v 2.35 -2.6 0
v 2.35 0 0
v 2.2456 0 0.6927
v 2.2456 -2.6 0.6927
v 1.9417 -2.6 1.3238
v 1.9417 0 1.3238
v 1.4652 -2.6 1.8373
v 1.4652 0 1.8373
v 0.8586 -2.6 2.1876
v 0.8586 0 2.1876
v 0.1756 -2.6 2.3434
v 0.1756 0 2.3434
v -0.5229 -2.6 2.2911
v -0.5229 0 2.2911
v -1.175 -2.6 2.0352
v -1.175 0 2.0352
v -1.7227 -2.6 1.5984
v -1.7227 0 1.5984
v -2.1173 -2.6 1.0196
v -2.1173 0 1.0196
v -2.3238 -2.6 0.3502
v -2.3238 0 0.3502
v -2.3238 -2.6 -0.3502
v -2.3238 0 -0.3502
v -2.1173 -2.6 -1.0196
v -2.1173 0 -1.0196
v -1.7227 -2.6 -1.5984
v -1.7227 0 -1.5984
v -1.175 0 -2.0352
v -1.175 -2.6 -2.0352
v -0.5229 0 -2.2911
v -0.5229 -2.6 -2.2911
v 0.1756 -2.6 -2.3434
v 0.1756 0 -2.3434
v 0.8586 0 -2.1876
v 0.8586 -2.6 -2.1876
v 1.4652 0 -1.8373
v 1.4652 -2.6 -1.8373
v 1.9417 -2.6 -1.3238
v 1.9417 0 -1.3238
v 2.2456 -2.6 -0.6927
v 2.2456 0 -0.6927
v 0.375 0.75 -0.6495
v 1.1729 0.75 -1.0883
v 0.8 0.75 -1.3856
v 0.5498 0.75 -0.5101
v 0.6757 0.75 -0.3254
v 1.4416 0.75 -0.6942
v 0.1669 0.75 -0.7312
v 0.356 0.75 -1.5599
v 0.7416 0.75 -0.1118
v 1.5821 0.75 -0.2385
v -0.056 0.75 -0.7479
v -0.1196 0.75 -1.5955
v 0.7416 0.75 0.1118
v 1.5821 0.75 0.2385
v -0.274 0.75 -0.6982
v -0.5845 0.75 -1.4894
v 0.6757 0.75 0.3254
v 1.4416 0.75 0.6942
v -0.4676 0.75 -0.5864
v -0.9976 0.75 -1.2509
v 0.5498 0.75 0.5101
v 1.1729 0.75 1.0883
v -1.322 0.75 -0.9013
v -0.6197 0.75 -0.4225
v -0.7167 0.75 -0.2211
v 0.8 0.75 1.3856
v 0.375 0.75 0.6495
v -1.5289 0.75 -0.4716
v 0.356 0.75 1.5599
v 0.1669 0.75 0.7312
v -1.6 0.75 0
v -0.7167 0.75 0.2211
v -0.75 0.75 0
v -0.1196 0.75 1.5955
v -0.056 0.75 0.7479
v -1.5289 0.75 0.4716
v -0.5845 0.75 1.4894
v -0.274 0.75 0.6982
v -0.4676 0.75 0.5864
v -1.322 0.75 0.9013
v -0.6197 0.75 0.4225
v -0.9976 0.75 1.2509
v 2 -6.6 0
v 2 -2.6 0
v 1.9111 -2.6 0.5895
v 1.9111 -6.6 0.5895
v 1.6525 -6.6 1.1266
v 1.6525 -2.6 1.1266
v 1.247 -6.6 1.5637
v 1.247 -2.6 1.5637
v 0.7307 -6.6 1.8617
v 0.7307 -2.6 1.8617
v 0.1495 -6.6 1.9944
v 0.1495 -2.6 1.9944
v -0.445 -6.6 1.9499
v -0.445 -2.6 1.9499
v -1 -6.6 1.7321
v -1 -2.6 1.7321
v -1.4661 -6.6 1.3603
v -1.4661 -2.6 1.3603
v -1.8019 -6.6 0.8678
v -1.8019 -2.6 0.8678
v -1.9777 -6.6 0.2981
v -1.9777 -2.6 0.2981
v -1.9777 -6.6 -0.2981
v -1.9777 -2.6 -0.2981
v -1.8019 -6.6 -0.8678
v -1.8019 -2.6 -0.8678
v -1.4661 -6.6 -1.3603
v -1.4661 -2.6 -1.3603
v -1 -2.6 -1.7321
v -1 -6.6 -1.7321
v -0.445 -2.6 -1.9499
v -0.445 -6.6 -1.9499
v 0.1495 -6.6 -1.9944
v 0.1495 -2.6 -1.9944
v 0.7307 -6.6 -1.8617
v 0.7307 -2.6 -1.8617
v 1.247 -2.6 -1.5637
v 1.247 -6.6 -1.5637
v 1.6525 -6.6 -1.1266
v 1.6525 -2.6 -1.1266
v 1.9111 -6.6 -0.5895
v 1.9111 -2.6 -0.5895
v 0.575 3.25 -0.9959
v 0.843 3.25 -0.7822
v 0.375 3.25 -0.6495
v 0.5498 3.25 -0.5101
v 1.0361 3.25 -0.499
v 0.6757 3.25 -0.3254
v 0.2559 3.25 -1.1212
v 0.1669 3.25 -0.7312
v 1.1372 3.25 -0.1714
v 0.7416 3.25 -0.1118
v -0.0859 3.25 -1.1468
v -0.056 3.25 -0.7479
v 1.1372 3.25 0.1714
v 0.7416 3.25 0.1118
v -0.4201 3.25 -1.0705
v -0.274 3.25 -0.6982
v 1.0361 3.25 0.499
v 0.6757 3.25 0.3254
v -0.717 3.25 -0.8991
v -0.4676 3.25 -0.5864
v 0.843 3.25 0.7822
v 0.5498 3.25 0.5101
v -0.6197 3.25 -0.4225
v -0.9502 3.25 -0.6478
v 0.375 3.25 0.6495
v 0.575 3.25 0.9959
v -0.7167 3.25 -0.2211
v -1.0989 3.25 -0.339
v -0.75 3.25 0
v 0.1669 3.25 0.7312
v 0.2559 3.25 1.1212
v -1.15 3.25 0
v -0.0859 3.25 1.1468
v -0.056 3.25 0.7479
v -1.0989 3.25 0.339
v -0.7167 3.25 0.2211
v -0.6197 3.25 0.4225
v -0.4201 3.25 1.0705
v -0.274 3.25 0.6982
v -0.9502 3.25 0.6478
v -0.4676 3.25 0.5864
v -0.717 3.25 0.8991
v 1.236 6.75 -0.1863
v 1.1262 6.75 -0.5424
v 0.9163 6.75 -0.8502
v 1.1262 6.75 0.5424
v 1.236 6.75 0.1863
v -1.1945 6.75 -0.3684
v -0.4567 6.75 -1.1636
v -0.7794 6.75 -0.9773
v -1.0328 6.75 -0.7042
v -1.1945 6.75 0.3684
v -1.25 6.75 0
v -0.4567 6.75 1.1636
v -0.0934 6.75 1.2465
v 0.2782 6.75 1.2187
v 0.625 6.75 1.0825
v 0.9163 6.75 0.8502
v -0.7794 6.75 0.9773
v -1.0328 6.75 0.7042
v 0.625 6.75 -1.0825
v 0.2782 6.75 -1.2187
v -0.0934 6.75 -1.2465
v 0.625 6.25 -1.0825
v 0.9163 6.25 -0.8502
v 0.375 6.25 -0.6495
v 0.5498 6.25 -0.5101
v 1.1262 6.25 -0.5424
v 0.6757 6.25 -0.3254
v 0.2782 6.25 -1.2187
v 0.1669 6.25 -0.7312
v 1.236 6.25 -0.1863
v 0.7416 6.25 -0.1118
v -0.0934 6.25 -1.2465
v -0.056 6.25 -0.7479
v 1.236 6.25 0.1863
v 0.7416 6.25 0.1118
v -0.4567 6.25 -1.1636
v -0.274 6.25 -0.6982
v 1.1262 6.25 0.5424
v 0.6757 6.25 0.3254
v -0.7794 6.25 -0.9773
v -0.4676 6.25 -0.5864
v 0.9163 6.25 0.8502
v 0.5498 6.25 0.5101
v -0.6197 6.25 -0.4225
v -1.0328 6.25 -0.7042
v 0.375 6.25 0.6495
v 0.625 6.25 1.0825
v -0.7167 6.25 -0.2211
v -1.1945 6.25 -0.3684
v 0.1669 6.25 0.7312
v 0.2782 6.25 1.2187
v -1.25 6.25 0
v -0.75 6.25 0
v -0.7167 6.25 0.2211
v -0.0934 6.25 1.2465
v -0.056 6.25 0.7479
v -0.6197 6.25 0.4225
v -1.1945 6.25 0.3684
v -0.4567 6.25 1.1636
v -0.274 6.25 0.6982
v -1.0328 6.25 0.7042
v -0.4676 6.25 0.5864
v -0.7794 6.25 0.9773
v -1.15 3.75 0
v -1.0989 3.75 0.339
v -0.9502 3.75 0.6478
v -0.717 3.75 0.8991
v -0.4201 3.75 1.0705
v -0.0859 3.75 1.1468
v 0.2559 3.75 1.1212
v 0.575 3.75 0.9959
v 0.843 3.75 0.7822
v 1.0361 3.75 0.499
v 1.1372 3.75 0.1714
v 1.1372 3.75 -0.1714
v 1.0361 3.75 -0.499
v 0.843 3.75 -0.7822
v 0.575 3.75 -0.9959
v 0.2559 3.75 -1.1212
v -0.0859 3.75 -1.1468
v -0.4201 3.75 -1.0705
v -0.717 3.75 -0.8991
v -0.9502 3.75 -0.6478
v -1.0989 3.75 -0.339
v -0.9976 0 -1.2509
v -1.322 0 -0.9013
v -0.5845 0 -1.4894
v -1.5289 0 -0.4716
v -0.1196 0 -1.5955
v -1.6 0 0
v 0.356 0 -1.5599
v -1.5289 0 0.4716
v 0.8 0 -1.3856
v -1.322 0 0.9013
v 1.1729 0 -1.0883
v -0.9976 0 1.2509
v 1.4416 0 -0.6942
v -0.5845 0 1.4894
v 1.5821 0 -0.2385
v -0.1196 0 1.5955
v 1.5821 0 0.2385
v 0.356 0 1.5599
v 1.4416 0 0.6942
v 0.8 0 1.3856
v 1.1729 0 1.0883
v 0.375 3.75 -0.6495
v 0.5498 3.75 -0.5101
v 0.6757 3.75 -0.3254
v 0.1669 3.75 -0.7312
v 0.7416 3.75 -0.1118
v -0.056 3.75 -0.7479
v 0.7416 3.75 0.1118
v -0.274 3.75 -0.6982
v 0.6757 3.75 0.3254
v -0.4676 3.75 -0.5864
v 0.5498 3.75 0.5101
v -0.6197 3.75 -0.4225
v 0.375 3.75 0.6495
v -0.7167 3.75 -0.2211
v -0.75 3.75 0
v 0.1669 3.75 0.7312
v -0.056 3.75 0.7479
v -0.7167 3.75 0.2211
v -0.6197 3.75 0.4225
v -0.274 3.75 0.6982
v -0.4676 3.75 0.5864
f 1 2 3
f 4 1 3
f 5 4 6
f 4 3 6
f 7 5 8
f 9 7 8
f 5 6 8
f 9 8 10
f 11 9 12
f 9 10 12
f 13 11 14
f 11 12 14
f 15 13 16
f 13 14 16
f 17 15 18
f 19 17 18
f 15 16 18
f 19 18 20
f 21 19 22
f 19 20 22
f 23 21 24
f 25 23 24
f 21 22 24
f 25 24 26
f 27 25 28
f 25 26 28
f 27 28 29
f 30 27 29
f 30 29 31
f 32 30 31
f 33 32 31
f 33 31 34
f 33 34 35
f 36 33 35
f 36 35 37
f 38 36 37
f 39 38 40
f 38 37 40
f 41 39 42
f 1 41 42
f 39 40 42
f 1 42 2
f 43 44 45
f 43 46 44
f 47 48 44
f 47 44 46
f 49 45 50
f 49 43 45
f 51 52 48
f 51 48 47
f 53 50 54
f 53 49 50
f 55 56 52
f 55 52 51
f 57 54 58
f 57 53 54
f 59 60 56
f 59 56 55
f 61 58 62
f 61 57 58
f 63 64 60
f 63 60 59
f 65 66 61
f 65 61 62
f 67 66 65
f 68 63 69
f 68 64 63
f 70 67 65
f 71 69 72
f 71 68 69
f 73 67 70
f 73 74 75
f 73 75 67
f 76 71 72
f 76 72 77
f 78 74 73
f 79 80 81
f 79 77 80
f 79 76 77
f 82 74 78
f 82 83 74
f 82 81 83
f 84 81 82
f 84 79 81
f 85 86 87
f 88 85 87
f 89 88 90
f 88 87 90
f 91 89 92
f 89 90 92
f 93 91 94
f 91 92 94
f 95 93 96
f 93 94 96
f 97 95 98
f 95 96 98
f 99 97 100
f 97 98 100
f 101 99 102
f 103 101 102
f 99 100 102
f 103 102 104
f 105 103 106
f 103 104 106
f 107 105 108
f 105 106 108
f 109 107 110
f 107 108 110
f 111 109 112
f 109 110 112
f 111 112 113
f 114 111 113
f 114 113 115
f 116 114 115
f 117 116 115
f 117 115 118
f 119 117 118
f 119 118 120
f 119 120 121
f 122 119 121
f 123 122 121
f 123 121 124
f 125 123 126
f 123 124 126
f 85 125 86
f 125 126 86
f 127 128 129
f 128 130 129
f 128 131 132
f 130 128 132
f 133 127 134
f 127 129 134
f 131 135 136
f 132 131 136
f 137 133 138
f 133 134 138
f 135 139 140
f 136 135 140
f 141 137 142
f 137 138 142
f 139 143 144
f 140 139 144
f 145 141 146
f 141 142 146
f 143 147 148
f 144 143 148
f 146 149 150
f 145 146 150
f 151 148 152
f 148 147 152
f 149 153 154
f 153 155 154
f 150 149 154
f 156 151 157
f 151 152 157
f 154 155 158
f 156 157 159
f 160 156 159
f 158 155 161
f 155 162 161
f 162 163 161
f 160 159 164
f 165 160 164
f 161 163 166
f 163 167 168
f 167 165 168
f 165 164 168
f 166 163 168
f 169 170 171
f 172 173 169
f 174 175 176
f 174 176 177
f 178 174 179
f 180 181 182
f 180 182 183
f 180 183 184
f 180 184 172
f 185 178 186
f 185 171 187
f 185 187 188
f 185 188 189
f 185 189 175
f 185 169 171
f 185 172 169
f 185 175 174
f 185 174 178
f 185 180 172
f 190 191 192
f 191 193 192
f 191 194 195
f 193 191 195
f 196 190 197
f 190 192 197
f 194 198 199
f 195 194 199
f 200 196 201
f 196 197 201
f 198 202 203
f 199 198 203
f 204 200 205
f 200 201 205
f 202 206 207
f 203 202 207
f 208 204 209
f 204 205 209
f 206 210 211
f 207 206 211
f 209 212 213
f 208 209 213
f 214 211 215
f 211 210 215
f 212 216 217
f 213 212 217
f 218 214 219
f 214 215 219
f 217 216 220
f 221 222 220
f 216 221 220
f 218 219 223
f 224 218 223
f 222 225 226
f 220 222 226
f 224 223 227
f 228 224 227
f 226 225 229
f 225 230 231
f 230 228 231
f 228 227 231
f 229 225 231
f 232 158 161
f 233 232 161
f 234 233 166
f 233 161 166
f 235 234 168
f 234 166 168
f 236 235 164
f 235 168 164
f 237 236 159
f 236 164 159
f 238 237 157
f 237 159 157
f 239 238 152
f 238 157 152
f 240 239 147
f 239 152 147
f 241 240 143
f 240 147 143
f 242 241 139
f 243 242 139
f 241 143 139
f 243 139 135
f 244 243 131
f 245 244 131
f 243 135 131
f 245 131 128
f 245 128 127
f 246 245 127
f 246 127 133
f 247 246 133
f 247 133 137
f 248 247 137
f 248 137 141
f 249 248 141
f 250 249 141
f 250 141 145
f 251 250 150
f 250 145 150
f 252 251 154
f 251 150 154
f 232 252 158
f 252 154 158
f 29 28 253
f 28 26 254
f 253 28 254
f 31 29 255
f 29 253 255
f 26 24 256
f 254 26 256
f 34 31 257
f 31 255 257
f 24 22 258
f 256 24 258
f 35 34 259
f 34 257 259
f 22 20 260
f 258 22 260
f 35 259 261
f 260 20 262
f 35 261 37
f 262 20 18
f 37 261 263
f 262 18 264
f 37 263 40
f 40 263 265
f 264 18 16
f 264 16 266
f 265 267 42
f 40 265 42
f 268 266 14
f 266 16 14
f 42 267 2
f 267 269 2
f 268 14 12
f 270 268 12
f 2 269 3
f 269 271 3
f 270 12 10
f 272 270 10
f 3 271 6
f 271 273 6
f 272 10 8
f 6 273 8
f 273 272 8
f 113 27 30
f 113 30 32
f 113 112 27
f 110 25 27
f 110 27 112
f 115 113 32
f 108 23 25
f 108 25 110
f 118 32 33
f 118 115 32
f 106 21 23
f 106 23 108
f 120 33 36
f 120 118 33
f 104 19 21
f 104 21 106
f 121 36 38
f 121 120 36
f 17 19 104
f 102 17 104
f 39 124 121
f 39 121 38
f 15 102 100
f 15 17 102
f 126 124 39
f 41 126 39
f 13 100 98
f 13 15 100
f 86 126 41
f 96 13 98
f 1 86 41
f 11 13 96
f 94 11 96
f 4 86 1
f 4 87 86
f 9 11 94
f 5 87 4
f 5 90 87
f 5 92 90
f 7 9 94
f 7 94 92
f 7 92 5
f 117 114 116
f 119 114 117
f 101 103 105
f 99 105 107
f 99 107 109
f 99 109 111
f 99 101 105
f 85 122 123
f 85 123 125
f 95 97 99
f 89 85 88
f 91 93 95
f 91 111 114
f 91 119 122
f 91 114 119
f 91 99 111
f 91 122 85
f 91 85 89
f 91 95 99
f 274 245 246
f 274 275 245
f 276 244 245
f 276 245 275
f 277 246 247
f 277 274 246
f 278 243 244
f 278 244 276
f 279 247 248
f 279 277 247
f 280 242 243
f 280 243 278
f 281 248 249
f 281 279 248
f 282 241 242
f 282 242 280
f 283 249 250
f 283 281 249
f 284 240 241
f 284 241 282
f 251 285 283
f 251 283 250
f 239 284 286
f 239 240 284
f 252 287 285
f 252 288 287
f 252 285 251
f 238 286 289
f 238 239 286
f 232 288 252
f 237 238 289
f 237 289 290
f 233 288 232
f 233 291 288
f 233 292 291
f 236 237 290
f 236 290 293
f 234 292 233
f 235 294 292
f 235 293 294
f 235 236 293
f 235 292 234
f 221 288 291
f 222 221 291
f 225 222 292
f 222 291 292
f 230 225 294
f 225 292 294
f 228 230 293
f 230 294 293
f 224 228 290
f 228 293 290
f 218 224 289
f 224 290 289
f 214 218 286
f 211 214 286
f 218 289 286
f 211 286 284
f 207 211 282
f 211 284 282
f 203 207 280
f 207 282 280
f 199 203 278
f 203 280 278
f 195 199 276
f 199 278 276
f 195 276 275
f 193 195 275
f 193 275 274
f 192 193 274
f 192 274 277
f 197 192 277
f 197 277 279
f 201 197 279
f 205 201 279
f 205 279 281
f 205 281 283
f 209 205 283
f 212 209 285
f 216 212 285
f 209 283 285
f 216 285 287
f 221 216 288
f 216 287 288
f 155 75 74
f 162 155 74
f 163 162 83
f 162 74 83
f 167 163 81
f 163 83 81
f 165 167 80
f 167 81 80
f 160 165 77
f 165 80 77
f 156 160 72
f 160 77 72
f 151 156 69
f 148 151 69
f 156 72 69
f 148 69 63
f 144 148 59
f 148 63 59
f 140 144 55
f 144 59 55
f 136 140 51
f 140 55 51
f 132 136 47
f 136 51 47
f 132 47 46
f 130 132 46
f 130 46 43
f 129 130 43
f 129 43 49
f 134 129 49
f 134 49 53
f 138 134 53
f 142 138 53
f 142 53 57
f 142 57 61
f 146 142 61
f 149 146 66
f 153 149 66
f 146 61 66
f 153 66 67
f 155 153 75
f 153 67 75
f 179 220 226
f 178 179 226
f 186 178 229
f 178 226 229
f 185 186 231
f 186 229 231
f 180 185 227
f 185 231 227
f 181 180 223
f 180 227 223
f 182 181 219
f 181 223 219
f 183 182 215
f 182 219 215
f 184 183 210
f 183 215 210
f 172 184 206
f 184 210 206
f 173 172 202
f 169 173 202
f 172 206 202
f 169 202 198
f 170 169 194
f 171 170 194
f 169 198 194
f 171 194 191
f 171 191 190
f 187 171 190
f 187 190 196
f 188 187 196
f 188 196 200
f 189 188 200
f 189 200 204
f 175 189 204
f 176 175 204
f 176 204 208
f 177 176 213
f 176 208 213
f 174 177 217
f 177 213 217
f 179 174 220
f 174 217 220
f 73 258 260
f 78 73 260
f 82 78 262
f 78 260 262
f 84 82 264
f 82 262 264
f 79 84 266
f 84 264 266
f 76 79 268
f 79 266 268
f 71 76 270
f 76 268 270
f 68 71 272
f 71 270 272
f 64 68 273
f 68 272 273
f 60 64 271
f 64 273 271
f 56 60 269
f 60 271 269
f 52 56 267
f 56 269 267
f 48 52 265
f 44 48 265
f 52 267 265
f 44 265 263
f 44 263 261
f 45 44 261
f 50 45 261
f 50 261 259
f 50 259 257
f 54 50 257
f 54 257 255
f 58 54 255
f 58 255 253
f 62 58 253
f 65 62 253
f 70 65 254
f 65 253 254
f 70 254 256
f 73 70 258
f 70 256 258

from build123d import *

# Parameters (mm, degrees)
F0_R      = 2.35
F1_DEPTH  = 2.6
F2_R      = 2
F3_DEPTH  = 4
F4_R      = 1.6
F5_DEPTH  = 0.75
F6_R      = 0.75
F7_DEPTH  = 2.5
F8_R      = 1.15
F9_DEPTH  = 0.5
F10_R     = 0.75
F11_DEPTH = 2.5
F12_R     = 1.25
F13_DEPTH = 0.5


with BuildPart() as f1:
    # F0 (on Front) → F1 (new body)
    with BuildSketch(Plane.XZ):
        Circle(F0_R)
    extrude(amount=F1_DEPTH)

    # F2 (on face) → F3 (join)
    with BuildSketch(Plane.XZ.offset(2.6)):
        Circle(F2_R)
    extrude(amount=F3_DEPTH)

    # F4 (on face) → F5 (join)
    with BuildSketch(Plane(origin=(0, 0, 0), x_dir=(-1, 0, 0), z_dir=(0, 1, 0))):
        Circle(F4_R)
    extrude(amount=F5_DEPTH)

    # F6 (on face) → F7 (join)
    with BuildSketch(Plane(origin=(0, 0.75, 0), x_dir=(-1, 0, 0), z_dir=(0, 1, 0))):
        Circle(F6_R)
    extrude(amount=F7_DEPTH)

    # F8 (on face) → F9 (join)
    with BuildSketch(Plane(origin=(0, 3.25, 0), x_dir=(-1, 0, 0), z_dir=(0, 1, 0))):
        Circle(F8_R)
    extrude(amount=F9_DEPTH)

    # F10 (on face) → F11 (join)
    with BuildSketch(Plane(origin=(0, 3.75, 0), x_dir=(-1, 0, 0), z_dir=(0, 1, 0))):
        Circle(F10_R)
    extrude(amount=F11_DEPTH)

    # F12 (on face) → F13 (join)
    with BuildSketch(Plane(origin=(0, 6.25, 0), x_dir=(-1, 0, 0), z_dir=(0, 1, 0))):
        Circle(F12_R)
    extrude(amount=F13_DEPTH)


solid = f1.part
